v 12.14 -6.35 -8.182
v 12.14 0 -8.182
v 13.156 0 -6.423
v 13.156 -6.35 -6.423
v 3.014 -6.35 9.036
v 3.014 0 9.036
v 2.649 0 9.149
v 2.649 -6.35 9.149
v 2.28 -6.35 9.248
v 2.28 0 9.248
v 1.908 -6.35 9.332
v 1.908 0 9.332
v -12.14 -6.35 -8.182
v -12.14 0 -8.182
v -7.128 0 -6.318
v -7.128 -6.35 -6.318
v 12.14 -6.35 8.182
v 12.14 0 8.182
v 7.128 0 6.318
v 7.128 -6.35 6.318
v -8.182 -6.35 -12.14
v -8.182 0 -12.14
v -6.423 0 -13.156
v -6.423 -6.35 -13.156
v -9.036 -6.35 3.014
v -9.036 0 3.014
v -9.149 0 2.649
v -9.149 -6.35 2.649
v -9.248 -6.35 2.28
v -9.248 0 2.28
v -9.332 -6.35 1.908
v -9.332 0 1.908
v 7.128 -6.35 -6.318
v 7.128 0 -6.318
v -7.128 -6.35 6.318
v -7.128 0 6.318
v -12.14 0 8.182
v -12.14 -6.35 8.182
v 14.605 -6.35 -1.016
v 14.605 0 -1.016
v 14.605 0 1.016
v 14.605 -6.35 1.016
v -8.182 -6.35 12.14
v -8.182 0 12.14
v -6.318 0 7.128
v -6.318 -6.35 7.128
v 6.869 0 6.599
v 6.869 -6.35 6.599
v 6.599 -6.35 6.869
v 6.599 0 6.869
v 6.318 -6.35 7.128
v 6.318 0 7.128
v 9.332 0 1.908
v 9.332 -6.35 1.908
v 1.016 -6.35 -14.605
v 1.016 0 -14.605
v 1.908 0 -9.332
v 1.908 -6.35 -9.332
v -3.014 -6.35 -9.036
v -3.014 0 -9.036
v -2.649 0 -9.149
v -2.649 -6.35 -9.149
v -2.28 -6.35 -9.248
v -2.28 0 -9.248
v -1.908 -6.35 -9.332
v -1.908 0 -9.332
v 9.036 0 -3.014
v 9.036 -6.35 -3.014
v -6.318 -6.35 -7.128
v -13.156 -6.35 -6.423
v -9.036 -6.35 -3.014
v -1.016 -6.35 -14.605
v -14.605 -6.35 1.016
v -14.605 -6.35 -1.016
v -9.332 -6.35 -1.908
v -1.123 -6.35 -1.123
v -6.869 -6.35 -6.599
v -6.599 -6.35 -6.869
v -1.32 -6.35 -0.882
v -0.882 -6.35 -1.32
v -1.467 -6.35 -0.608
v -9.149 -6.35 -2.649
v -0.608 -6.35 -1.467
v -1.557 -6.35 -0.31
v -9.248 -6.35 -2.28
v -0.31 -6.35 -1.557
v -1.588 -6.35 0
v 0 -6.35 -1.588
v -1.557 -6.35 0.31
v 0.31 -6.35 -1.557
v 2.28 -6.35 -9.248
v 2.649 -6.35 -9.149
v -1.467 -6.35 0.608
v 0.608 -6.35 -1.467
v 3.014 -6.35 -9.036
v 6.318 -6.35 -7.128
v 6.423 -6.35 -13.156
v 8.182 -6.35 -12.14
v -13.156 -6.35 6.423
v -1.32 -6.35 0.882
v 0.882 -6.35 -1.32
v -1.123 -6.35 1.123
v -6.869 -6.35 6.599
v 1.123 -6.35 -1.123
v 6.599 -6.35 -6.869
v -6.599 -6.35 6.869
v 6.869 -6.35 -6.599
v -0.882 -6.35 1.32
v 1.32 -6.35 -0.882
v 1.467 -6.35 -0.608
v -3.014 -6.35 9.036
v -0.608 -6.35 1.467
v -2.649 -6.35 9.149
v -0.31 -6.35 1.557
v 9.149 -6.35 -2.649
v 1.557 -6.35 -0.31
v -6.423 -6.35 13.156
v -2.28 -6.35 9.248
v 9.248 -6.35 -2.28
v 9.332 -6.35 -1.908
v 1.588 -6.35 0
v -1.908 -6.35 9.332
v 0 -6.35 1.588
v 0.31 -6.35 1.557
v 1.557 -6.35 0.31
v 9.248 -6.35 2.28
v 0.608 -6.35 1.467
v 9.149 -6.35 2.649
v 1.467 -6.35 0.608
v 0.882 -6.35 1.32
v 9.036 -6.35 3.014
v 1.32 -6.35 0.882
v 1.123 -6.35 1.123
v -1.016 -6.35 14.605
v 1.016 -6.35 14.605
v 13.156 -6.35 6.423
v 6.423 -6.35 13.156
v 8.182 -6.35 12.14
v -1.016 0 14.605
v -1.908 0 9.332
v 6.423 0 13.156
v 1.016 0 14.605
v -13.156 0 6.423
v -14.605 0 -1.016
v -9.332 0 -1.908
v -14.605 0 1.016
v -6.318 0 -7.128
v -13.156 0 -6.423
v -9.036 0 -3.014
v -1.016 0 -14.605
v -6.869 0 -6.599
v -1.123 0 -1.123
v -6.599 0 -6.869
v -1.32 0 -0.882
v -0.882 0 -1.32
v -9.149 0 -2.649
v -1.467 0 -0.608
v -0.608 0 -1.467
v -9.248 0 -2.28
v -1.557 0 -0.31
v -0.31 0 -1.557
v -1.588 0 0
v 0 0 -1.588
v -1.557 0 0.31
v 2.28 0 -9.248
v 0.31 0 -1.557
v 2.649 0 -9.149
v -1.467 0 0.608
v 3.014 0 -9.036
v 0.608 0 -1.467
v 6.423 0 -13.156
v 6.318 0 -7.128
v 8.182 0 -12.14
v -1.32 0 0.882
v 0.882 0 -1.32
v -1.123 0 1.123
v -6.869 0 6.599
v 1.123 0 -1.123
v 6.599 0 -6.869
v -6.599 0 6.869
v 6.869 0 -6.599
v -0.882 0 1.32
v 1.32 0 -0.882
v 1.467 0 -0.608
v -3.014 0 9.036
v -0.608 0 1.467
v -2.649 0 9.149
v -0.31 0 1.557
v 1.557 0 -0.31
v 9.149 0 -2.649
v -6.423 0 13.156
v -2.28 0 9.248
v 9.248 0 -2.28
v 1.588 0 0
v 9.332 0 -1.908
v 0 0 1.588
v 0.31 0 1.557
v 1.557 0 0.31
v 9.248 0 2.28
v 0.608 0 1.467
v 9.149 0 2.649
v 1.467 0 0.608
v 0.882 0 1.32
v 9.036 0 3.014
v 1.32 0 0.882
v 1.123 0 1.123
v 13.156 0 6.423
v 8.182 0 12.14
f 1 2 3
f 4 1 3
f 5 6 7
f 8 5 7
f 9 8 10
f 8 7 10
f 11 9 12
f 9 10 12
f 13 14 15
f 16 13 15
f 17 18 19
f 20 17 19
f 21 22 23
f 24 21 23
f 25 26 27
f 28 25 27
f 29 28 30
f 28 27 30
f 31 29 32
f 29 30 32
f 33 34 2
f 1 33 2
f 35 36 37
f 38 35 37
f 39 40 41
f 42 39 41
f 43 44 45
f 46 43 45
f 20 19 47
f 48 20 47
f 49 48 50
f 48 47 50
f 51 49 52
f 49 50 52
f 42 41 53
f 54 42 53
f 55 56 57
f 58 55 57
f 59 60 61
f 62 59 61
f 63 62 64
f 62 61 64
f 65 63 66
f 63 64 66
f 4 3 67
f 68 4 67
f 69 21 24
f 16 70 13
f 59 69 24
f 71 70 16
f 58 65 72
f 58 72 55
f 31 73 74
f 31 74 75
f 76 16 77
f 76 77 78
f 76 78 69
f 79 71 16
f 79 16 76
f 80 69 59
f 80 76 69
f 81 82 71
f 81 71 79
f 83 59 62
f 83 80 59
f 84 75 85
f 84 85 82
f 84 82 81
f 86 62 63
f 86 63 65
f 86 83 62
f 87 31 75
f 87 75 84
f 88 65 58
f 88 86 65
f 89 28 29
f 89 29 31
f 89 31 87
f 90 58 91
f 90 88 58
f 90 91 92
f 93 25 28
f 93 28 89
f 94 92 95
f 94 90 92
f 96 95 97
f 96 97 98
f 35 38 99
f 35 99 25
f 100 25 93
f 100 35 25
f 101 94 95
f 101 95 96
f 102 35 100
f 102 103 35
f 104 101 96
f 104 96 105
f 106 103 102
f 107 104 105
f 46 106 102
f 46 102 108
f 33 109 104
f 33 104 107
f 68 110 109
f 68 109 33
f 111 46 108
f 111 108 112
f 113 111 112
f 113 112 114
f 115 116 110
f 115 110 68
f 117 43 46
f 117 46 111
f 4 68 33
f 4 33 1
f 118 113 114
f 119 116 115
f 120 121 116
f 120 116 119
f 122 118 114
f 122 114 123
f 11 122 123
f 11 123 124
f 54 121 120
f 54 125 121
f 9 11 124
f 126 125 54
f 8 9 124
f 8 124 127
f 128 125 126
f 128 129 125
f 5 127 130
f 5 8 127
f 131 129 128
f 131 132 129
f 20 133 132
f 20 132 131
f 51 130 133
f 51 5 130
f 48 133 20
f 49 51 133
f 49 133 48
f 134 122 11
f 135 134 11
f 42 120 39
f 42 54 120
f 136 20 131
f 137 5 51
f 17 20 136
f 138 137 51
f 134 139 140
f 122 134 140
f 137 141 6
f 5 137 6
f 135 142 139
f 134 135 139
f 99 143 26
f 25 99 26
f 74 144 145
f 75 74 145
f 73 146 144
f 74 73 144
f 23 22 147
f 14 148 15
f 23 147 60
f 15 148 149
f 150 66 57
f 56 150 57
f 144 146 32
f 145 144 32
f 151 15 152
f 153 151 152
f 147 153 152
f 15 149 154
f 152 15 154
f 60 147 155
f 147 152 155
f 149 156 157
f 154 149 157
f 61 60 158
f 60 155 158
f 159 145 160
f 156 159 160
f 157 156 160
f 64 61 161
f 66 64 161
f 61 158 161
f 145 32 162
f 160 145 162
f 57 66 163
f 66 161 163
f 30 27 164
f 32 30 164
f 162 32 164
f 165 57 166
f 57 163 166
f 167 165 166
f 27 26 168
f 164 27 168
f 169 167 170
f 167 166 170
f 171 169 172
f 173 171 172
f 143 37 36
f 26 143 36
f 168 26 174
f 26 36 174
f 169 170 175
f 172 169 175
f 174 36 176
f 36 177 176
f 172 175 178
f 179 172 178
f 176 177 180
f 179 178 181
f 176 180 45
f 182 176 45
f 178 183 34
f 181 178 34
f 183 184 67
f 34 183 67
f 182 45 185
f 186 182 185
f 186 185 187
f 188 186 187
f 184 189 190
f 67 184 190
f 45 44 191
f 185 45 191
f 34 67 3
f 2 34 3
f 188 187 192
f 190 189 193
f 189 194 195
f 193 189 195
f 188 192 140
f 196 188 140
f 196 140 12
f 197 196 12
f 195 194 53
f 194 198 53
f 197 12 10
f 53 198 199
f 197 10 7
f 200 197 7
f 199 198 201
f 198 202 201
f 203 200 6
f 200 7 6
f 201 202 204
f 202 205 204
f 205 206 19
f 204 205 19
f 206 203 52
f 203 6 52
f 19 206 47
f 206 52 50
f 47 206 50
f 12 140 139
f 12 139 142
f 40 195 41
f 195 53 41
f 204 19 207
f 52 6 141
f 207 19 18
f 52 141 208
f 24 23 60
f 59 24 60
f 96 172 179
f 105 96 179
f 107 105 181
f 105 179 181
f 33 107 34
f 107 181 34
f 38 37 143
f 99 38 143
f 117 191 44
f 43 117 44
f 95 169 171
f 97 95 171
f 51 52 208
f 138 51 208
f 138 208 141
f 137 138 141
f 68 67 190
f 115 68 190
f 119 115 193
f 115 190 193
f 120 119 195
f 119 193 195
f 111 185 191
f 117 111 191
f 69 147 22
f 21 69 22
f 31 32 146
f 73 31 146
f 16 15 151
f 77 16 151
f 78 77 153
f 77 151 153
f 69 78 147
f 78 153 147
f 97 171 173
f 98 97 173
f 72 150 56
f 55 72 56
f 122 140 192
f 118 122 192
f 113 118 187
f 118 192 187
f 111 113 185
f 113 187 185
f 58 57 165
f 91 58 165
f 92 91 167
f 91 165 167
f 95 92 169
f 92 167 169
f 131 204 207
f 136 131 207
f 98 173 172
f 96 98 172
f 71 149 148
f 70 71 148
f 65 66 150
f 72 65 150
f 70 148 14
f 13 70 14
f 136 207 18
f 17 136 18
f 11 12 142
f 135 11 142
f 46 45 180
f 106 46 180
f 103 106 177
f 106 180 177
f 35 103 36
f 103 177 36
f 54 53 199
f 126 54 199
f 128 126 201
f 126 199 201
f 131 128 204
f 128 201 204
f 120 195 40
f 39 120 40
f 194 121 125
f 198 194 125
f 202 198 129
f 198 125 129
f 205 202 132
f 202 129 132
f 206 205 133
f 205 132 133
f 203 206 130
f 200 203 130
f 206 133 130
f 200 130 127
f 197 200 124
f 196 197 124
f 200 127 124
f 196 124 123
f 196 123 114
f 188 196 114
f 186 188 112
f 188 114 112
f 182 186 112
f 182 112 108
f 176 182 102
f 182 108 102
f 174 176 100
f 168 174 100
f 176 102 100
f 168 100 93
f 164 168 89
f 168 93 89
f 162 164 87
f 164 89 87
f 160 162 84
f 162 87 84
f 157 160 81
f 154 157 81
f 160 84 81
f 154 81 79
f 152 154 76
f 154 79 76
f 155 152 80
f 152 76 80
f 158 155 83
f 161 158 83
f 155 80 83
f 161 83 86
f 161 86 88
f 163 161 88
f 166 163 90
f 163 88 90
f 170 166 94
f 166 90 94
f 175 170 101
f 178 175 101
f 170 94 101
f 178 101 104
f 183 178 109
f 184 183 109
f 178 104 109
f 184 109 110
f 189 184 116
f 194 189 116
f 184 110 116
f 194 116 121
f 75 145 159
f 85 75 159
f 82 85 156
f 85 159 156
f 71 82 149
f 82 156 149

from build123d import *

# Parameters (mm, degrees)
F1_DEPTH = 6.35
F2_R     = 1.5875
F3_DEPTH = 6.35


with BuildPart() as f1:
    # F0 (on Front) → F1 (new body)
    with BuildSketch(Plane.XZ):
        with BuildLine():
            ThreePointArc((-6.318335, 7.127711), (-4.7625, 8.248892), (-3.013611, 9.035694))
            Line((-3.013611, 9.035694), (-6.422618, 13.156301))
            Line((-6.422618, 13.156301), (-7.3025, 12.648301))
            Line((-7.3025, 12.648301), (-8.182382, 12.140301))
            Line((-8.182382, 12.140301), (-6.318335, 7.127711))
        make_face()
        with BuildLine():
            ThreePointArc((-9.035694, 3.013611), (-8.248892, 4.7625), (-7.127711, 6.318335))
            Line((-7.127711, 6.318335), (-12.140301, 8.182382))
            Line((-12.140301, 8.182382), (-12.648301, 7.3025))
            Line((-12.648301, 7.3025), (-13.156301, 6.422618))
            Line((-13.156301, 6.422618), (-9.035694, 3.013611))
        make_face()
        with BuildLine():
            Line((-14.605, -1.016), (-9.331946, -1.907983))
            ThreePointArc((-9.331946, -1.907983), (-9.525, 0), (-9.331946, 1.907983))
            Line((-9.331946, 1.907983), (-14.605, 1.016))
            Line((-14.605, 1.016), (-14.605, 0))
            Line((-14.605, 0), (-14.605, -1.016))
        make_face()
        with BuildLine():
            Line((-6.422618, -13.156301), (-3.013611, -9.035694))
            ThreePointArc((-3.013611, -9.035694), (-4.7625, -8.248892), (-6.318335, -7.127711))
            Line((-6.318335, -7.127711), (-8.182382, -12.140301))
            Line((-8.182382, -12.140301), (-7.3025, -12.648301))
            Line((-7.3025, -12.648301), (-6.422618, -13.156301))
        make_face()
        with BuildLine():
            Line((-12.140301, -8.182382), (-7.127711, -6.318335))
            ThreePointArc((-7.127711, -6.318335), (-8.248892, -4.7625), (-9.035694, -3.013611))
            Line((-9.035694, -3.013611), (-13.156301, -6.422618))
            Line((-13.156301, -6.422618), (-12.648301, -7.3025))
            Line((-12.648301, -7.3025), (-12.140301, -8.182382))
        make_face()
        with BuildLine():
            ThreePointArc((9.331946, -1.907983), (9.476614, -0.958863), (9.525, 0))
            ThreePointArc((9.525, 0), (9.476614, 0.958863), (9.331946, 1.907983))
            ThreePointArc((9.331946, 1.907983), (9.200443, 2.465251), (9.035694, 3.013611))
            ThreePointArc((9.035694, 3.013611), (8.248892, 4.7625), (7.127711, 6.318335))
            ThreePointArc((7.127711, 6.318335), (6.735192, 6.735192), (6.318335, 7.127711))
            ThreePointArc((6.318335, 7.127711), (4.7625, 8.248892), (3.013611, 9.035694))
            ThreePointArc((3.013611, 9.035694), (2.465251, 9.200443), (1.907983, 9.331946))
            ThreePointArc((1.907983, 9.331946), (0.958863, 9.476614), (0, 9.525))
            ThreePointArc((0, 9.525), (-0.958863, 9.476614), (-1.907983, 9.331946))
            ThreePointArc((-1.907983, 9.331946), (-2.465251, 9.200443), (-3.013611, 9.035694))
            ThreePointArc((-3.013611, 9.035694), (-4.7625, 8.248892), (-6.318335, 7.127711))
            ThreePointArc((-6.318335, 7.127711), (-6.735192, 6.735192), (-7.127711, 6.318335))
            ThreePointArc((-7.127711, 6.318335), (-8.248892, 4.7625), (-9.035694, 3.013611))
            ThreePointArc((-9.035694, 3.013611), (-9.200443, 2.465251), (-9.331946, 1.907983))
            ThreePointArc((-9.331946, 1.907983), (-9.525, 0), (-9.331946, -1.907983))
            ThreePointArc((-9.331946, -1.907983), (-9.200443, -2.465251), (-9.035694, -3.013611))
            ThreePointArc((-9.035694, -3.013611), (-8.248892, -4.7625), (-7.127711, -6.318335))
            ThreePointArc((-7.127711, -6.318335), (-6.735192, -6.735192), (-6.318335, -7.127711))
            ThreePointArc((-6.318335, -7.127711), (-4.7625, -8.248892), (-3.013611, -9.035694))
            ThreePointArc((-3.013611, -9.035694), (-2.465251, -9.200443), (-1.907983, -9.331946))
            ThreePointArc((-1.907983, -9.331946), (0, -9.525), (1.907983, -9.331946))
            ThreePointArc((1.907983, -9.331946), (2.465251, -9.200443), (3.013611, -9.035694))
            ThreePointArc((3.013611, -9.035694), (4.7625, -8.248892), (6.318335, -7.127711))
            ThreePointArc((6.318335, -7.127711), (6.735192, -6.735192), (7.127711, -6.318335))
            ThreePointArc((7.127711, -6.318335), (8.248892, -4.7625), (9.035694, -3.013611))
            ThreePointArc((9.035694, -3.013611), (9.200443, -2.465251), (9.331946, -1.907983))
        make_face()
        with BuildLine():
            Line((1.016, -14.605), (1.907983, -9.331946))
            ThreePointArc((1.907983, -9.331946), (0, -9.525), (-1.907983, -9.331946))
            Line((-1.907983, -9.331946), (-1.016, -14.605))
            Line((-1.016, -14.605), (0, -14.605))
            Line((0, -14.605), (1.016, -14.605))
        make_face()
        with BuildLine():
            Line((8.182382, -12.140301), (6.318335, -7.127711))
            ThreePointArc((6.318335, -7.127711), (4.7625, -8.248892), (3.013611, -9.035694))
            Line((3.013611, -9.035694), (6.422618, -13.156301))
            Line((6.422618, -13.156301), (7.3025, -12.648301))
            Line((7.3025, -12.648301), (8.182382, -12.140301))
        make_face()
        with BuildLine():
            Line((13.156301, -6.422618), (9.035694, -3.013611))
            ThreePointArc((9.035694, -3.013611), (8.248892, -4.7625), (7.127711, -6.318335))
            Line((7.127711, -6.318335), (12.140301, -8.182382))
            Line((12.140301, -8.182382), (12.648301, -7.3025))
            Line((12.648301, -7.3025), (13.156301, -6.422618))
        make_face()
        with BuildLine():
            ThreePointArc((9.331946, 1.907983), (9.476614, 0.958863), (9.525, 0))
            ThreePointArc((9.525, 0), (9.476614, -0.958863), (9.331946, -1.907983))
            Line((9.331946, -1.907983), (14.605, -1.016))
            Line((14.605, -1.016), (14.605, 0))
            Line((14.605, 0), (14.605, 1.016))
            Line((14.605, 1.016), (9.331946, 1.907983))
        make_face()
        with BuildLine():
            ThreePointArc((7.127711, 6.318335), (8.248892, 4.7625), (9.035694, 3.013611))
            Line((9.035694, 3.013611), (13.156301, 6.422618))
            Line((13.156301, 6.422618), (12.648301, 7.3025))
            Line((12.648301, 7.3025), (12.140301, 8.182382))
            Line((12.140301, 8.182382), (7.127711, 6.318335))
        make_face()
        with BuildLine():
            ThreePointArc((3.013611, 9.035694), (4.7625, 8.248892), (6.318335, 7.127711))
            Line((6.318335, 7.127711), (8.182382, 12.140301))
            Line((8.182382, 12.140301), (7.3025, 12.648301))
            Line((7.3025, 12.648301), (6.422618, 13.156301))
            Line((6.422618, 13.156301), (3.013611, 9.035694))
        make_face()
        with BuildLine():
            ThreePointArc((-1.907983, 9.331946), (-0.958863, 9.476614), (0, 9.525))
            Line((0, 9.525), (0, 14.605))
            Line((0, 14.605), (-1.016, 14.605))
            Line((-1.016, 14.605), (-1.907983, 9.331946))
        make_face()
        with BuildLine():
            ThreePointArc((0, 9.525), (0.958863, 9.476614), (1.907983, 9.331946))
            Line((1.907983, 9.331946), (1.016, 14.605))
            Line((1.016, 14.605), (0, 14.605))
            Line((0, 14.605), (0, 9.525))
        make_face()
    extrude(amount=F1_DEPTH)

    # F2 (on face) → F3 (cut)
    with BuildSketch(Plane.XZ.offset(6.35)):
        Circle(F2_R)
    extrude(amount=-F3_DEPTH, mode=Mode.SUBTRACT)


solid = f1.part
